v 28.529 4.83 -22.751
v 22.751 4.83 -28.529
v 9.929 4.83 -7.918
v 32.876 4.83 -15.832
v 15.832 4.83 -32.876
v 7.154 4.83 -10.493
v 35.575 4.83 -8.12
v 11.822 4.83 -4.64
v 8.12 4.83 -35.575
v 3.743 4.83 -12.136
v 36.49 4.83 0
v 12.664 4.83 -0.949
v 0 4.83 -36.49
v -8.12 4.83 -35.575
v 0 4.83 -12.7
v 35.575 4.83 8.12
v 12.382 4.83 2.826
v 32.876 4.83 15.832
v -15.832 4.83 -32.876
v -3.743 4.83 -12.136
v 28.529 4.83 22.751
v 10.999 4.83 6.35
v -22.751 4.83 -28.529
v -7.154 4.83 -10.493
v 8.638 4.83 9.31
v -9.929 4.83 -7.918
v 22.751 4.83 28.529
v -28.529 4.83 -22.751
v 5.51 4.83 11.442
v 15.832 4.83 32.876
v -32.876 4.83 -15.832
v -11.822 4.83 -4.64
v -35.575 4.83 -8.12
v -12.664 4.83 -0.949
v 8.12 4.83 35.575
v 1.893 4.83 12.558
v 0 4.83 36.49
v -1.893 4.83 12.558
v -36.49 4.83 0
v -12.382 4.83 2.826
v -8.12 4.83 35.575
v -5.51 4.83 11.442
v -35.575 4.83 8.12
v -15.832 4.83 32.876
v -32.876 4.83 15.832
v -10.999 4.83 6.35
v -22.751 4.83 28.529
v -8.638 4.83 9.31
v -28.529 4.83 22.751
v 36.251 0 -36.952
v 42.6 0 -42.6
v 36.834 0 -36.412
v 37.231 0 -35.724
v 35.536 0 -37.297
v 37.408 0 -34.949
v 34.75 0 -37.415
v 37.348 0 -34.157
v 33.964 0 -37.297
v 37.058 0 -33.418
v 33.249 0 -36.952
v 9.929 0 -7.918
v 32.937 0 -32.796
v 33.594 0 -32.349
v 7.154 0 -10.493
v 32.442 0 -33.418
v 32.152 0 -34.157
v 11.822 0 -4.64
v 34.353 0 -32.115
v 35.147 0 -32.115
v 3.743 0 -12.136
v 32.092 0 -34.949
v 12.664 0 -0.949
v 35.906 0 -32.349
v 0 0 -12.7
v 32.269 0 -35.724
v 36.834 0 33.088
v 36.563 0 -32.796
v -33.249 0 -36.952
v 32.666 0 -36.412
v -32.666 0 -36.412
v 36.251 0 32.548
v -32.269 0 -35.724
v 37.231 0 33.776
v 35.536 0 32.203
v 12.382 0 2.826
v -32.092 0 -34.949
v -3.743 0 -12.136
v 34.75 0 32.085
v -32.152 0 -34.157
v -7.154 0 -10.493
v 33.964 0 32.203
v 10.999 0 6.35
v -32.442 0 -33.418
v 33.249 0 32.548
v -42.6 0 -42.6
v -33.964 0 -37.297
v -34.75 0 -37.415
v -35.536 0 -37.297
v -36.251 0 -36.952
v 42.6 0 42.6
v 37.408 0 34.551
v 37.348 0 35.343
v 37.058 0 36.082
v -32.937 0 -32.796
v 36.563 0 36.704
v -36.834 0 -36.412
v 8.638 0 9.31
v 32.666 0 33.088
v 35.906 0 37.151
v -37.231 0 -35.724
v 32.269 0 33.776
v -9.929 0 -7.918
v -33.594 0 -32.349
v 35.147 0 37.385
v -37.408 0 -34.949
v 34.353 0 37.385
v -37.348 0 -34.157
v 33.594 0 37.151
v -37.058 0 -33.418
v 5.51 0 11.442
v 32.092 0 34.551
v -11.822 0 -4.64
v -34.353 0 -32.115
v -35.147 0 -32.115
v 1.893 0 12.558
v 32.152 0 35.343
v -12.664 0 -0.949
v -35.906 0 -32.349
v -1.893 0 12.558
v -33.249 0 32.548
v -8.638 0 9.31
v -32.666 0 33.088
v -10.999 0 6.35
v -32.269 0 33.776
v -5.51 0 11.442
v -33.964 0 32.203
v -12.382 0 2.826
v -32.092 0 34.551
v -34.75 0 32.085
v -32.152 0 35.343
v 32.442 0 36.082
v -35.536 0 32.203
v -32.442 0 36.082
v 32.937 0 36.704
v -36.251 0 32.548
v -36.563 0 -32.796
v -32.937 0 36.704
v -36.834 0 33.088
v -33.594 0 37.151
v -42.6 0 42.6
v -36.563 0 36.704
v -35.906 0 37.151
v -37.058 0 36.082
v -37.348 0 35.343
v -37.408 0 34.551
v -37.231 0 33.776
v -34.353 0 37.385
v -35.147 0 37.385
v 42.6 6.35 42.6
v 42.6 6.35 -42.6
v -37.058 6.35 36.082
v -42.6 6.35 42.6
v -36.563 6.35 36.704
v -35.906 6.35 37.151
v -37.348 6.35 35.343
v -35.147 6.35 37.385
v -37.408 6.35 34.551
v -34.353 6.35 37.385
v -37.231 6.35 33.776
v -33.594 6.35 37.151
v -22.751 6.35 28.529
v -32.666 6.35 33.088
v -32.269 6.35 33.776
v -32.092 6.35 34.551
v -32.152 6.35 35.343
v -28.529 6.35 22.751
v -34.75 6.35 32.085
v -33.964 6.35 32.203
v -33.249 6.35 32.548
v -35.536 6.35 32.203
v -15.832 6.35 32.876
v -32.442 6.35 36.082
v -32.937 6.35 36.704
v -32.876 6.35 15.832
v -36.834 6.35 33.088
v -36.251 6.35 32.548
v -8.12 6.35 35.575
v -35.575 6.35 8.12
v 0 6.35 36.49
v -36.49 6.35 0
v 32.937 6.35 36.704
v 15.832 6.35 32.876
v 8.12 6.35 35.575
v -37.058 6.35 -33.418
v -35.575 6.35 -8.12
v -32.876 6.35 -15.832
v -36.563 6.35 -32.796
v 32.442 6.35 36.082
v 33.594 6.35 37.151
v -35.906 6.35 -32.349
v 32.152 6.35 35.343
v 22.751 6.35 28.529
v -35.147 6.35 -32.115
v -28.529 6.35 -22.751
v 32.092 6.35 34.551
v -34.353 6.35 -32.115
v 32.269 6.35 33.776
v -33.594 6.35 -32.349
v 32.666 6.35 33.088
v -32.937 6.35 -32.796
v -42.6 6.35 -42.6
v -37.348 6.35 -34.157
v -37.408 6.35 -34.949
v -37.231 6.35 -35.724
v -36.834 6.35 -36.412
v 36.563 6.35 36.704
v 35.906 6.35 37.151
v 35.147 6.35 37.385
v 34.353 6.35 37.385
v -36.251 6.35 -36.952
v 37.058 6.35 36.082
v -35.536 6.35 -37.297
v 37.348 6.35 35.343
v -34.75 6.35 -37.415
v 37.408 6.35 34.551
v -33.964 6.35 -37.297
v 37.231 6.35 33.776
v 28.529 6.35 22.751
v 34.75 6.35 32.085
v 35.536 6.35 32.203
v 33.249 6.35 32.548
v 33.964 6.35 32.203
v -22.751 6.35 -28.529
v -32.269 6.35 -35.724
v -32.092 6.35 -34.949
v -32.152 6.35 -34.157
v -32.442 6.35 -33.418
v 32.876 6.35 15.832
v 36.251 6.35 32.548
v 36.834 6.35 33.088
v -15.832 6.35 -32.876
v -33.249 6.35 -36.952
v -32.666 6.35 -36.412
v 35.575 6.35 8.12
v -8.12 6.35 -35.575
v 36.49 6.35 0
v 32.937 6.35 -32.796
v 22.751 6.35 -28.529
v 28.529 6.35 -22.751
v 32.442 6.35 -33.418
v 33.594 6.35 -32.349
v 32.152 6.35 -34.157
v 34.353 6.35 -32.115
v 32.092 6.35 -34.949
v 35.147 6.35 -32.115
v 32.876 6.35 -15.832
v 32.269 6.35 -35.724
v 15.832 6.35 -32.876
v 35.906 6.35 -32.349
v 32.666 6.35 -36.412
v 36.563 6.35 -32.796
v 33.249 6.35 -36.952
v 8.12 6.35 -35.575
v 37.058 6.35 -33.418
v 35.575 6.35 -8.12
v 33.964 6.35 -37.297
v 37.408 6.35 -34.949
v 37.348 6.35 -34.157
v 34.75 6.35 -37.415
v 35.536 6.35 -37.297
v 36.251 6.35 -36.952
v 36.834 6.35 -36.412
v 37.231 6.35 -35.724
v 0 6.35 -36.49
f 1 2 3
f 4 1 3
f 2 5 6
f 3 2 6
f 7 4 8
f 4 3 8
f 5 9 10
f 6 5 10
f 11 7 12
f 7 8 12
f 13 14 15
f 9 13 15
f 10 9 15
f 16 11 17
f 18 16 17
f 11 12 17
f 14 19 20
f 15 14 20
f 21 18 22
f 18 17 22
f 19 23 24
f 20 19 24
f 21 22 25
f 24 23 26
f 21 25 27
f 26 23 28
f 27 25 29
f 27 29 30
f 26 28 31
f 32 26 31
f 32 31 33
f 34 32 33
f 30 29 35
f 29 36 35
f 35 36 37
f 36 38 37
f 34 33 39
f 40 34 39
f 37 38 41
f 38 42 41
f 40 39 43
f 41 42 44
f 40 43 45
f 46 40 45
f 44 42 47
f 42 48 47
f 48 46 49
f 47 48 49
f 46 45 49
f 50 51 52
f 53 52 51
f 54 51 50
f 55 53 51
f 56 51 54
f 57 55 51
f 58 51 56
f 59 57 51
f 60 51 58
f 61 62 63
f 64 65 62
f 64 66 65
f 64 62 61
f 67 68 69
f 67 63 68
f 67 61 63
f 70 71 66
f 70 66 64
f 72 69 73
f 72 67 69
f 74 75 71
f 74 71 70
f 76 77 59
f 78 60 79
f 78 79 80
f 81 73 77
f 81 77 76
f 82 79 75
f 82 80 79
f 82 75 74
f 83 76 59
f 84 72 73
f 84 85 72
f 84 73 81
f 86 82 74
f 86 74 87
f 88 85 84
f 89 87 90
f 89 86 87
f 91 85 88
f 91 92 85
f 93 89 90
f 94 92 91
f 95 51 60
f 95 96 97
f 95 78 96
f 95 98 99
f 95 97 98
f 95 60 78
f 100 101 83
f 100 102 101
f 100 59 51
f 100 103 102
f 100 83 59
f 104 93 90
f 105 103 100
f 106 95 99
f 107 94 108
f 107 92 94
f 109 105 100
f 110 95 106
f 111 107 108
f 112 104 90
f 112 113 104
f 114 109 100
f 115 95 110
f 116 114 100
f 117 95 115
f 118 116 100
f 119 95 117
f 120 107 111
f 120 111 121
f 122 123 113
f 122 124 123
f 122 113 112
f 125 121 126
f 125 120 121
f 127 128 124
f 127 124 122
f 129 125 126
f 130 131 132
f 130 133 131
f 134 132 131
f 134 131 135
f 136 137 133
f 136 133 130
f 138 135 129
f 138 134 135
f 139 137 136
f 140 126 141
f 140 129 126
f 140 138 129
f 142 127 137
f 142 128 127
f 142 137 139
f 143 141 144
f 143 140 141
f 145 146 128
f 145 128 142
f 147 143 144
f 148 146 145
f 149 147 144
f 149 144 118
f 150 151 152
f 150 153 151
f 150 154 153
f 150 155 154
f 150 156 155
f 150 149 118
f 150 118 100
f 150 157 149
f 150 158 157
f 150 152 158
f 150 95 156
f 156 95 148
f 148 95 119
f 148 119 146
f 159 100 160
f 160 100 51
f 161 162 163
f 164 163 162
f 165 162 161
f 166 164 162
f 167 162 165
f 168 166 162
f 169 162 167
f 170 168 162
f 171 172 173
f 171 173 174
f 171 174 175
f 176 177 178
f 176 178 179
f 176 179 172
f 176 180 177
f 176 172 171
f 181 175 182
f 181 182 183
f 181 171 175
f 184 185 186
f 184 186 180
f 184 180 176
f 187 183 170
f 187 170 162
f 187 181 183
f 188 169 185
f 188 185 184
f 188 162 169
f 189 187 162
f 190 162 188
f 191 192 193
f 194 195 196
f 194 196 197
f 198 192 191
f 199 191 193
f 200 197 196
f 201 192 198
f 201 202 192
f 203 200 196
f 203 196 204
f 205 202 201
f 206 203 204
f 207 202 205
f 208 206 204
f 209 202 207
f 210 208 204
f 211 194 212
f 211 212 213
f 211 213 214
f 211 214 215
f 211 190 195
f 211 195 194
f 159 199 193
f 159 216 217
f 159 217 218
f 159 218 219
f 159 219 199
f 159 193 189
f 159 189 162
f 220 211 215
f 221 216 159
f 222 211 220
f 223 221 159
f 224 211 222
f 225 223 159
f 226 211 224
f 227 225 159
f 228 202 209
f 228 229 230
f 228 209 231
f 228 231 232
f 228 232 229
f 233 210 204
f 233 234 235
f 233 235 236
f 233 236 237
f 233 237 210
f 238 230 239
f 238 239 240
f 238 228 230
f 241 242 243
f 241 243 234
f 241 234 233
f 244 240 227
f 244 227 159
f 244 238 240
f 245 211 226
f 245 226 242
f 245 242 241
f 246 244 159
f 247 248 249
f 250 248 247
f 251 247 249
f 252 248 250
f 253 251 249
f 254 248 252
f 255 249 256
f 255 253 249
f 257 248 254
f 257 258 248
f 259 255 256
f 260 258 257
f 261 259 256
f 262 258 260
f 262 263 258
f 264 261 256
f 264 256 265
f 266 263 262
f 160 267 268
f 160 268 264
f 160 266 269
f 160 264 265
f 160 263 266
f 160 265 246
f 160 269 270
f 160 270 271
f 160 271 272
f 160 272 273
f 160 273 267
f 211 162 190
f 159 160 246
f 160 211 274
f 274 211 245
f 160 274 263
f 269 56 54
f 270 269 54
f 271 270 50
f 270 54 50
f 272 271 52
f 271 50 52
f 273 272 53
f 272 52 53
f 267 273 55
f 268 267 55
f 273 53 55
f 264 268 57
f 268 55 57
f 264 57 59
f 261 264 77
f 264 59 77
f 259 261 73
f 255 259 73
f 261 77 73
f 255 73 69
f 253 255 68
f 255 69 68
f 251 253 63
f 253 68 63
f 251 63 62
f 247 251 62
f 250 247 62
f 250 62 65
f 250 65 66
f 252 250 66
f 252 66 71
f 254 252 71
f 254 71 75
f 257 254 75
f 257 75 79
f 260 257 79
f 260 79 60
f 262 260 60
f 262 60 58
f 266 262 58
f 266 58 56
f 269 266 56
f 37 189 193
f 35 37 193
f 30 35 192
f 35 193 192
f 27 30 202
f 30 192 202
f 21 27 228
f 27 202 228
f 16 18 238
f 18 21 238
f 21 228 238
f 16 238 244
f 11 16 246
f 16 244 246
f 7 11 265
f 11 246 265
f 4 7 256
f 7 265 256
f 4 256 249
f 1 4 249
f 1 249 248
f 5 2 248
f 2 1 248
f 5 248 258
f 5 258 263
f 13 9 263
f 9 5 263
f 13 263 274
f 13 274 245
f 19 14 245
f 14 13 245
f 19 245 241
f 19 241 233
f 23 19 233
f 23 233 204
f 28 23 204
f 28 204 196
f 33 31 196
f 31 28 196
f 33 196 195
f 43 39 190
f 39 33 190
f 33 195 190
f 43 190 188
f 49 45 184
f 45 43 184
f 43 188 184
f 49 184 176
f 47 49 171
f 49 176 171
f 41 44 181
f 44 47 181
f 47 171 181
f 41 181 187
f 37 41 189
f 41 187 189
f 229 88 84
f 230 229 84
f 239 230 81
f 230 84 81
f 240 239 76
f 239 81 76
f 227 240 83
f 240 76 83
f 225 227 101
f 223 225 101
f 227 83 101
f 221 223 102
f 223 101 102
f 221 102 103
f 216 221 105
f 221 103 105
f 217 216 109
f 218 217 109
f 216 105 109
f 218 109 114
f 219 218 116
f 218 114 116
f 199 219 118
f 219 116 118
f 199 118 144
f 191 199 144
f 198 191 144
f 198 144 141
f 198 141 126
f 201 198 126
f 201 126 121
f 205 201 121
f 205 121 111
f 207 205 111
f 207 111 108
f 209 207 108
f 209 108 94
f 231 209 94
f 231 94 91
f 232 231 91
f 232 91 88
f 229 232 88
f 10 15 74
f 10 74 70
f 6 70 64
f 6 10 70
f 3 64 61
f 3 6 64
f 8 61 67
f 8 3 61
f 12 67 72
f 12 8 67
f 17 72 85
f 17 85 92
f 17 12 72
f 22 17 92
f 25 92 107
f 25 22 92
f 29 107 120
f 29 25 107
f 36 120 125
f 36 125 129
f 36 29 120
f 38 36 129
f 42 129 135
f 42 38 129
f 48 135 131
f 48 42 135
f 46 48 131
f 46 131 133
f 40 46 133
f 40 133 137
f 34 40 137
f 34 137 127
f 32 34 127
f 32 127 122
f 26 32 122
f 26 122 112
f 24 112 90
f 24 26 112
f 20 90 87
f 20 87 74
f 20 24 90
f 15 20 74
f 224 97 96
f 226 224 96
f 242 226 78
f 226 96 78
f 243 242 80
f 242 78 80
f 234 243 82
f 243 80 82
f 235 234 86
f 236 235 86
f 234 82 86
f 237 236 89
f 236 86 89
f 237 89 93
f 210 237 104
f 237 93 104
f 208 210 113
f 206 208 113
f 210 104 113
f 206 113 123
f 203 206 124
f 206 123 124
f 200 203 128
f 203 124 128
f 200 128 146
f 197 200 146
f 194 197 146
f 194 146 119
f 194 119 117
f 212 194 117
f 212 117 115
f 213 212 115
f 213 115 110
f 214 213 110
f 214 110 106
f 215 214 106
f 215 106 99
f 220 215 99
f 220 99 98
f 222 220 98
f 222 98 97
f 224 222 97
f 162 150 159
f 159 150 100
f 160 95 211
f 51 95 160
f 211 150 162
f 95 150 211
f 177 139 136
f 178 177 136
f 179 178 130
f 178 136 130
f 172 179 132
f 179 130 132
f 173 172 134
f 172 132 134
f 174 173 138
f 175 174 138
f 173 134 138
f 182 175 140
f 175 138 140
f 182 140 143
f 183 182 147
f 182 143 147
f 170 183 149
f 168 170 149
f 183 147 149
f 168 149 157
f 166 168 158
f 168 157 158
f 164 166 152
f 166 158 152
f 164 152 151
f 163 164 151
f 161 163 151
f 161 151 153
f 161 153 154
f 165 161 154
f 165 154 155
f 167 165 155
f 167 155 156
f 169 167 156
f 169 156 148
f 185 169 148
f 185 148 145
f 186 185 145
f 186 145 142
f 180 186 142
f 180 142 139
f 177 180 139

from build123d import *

# Parameters (mm, degrees)
SKETCH1_W           = 85.2
SKETCH1_H           = 85.2
BOSS_EXTRUDE1_DEPTH = 6.35
CUT_EXTRUDE1_REACH  = 62.579
SKETCH2_R           = 36.49
BOSS_EXTRUDE2_START = -4.83
SKETCH5_R           = 36.49
SKETCH5_R_2         = 12.7
BOSS_EXTRUDE2_DEPTH = 4.83
CUT_EXTRUDE2_REACH  = 62.579
SKETCH6_R           = 2.665


with BuildPart() as part:
    # Sketch1 → Boss-Extrude1 (new body)
    with BuildSketch(Plane(origin=(0, 0, 0), x_dir=(1, 0, 0), z_dir=(0, 1, 0))):
        Rectangle(SKETCH1_W, SKETCH1_H)
    extrude(amount=BOSS_EXTRUDE1_DEPTH)

    # Sketch2 → Cut-Extrude1 (cut, up to next)
    with BuildSketch(Plane(origin=(0, 6.35, 0), x_dir=(1, 0, 0), z_dir=(0, 1, 0)), mode=Mode.PRIVATE) as cut_extrude1_sk1:
        with Locations(Location((0, 0, 0), (0, 0, 270))):
            Circle(SKETCH2_R)
    cut_extrude1_tool1 = extrude(cut_extrude1_sk1.sketch, amount=-CUT_EXTRUDE1_REACH, mode=Mode.PRIVATE) & part.part
    add(cut_extrude1_tool1.solids().sort_by_distance((0, 6.35, 0))[0], mode=Mode.SUBTRACT)

    # Sketch5 → Boss-Extrude2 (add)
    with BuildSketch(Plane.XZ.offset(BOSS_EXTRUDE2_START)):
        with Locations(Location((0, 0, 0), (0, 0, 90))):
            Circle(SKETCH5_R)
        with Locations(Location((0, 0, 0), (0, 0, 270))):
            Circle(SKETCH5_R_2, mode=Mode.SUBTRACT)
    extrude(amount=BOSS_EXTRUDE2_DEPTH)

    # Sketch6 → Cut-Extrude2 (cut, up to next)
    with BuildSketch(Plane.XZ, mode=Mode.PRIVATE) as cut_extrude2_sk1:
        with Locations(Location((-34.75, -34.75, 0), (0, 0, 270))):
            Circle(SKETCH6_R)
    cut_extrude2_tool1 = extrude(cut_extrude2_sk1.sketch, amount=-CUT_EXTRUDE2_REACH, mode=Mode.PRIVATE) & part.part
    # Sketch6 → Cut-Extrude2 (cut, up to next)
    with BuildSketch(Plane.XZ, mode=Mode.PRIVATE) as cut_extrude2_sk2:
        with Locations(Location((-34.75, 34.75, 0), (0, 0, 270))):
            Circle(SKETCH6_R)
    cut_extrude2_tool2 = extrude(cut_extrude2_sk2.sketch, amount=-CUT_EXTRUDE2_REACH, mode=Mode.PRIVATE) & part.part
    # Sketch6 → Cut-Extrude2 (cut, up to next)
    with BuildSketch(Plane.XZ, mode=Mode.PRIVATE) as cut_extrude2_sk3:
        with Locations(Location((34.75, 34.75, 0), (0, 0, 270))):
            Circle(SKETCH6_R)
    cut_extrude2_tool3 = extrude(cut_extrude2_sk3.sketch, amount=-CUT_EXTRUDE2_REACH, mode=Mode.PRIVATE) & part.part
    # Sketch6 → Cut-Extrude2 (cut, up to next)
    with BuildSketch(Plane.XZ, mode=Mode.PRIVATE) as cut_extrude2_sk4:
        with Locations(Location((34.75, -34.75, 0), (0, 0, 270))):
            Circle(SKETCH6_R)
    cut_extrude2_tool4 = extrude(cut_extrude2_sk4.sketch, amount=-CUT_EXTRUDE2_REACH, mode=Mode.PRIVATE) & part.part
    add(cut_extrude2_tool1.solids().sort_by_distance((-34.75, 0, -34.75))[0], mode=Mode.SUBTRACT)
    add(cut_extrude2_tool2.solids().sort_by_distance((-34.75, 0, 34.75))[0], mode=Mode.SUBTRACT)
    add(cut_extrude2_tool3.solids().sort_by_distance((34.75, 0, 34.75))[0], mode=Mode.SUBTRACT)
    add(cut_extrude2_tool4.solids().sort_by_distance((34.75, 0, -34.75))[0], mode=Mode.SUBTRACT)


solid = part.part
